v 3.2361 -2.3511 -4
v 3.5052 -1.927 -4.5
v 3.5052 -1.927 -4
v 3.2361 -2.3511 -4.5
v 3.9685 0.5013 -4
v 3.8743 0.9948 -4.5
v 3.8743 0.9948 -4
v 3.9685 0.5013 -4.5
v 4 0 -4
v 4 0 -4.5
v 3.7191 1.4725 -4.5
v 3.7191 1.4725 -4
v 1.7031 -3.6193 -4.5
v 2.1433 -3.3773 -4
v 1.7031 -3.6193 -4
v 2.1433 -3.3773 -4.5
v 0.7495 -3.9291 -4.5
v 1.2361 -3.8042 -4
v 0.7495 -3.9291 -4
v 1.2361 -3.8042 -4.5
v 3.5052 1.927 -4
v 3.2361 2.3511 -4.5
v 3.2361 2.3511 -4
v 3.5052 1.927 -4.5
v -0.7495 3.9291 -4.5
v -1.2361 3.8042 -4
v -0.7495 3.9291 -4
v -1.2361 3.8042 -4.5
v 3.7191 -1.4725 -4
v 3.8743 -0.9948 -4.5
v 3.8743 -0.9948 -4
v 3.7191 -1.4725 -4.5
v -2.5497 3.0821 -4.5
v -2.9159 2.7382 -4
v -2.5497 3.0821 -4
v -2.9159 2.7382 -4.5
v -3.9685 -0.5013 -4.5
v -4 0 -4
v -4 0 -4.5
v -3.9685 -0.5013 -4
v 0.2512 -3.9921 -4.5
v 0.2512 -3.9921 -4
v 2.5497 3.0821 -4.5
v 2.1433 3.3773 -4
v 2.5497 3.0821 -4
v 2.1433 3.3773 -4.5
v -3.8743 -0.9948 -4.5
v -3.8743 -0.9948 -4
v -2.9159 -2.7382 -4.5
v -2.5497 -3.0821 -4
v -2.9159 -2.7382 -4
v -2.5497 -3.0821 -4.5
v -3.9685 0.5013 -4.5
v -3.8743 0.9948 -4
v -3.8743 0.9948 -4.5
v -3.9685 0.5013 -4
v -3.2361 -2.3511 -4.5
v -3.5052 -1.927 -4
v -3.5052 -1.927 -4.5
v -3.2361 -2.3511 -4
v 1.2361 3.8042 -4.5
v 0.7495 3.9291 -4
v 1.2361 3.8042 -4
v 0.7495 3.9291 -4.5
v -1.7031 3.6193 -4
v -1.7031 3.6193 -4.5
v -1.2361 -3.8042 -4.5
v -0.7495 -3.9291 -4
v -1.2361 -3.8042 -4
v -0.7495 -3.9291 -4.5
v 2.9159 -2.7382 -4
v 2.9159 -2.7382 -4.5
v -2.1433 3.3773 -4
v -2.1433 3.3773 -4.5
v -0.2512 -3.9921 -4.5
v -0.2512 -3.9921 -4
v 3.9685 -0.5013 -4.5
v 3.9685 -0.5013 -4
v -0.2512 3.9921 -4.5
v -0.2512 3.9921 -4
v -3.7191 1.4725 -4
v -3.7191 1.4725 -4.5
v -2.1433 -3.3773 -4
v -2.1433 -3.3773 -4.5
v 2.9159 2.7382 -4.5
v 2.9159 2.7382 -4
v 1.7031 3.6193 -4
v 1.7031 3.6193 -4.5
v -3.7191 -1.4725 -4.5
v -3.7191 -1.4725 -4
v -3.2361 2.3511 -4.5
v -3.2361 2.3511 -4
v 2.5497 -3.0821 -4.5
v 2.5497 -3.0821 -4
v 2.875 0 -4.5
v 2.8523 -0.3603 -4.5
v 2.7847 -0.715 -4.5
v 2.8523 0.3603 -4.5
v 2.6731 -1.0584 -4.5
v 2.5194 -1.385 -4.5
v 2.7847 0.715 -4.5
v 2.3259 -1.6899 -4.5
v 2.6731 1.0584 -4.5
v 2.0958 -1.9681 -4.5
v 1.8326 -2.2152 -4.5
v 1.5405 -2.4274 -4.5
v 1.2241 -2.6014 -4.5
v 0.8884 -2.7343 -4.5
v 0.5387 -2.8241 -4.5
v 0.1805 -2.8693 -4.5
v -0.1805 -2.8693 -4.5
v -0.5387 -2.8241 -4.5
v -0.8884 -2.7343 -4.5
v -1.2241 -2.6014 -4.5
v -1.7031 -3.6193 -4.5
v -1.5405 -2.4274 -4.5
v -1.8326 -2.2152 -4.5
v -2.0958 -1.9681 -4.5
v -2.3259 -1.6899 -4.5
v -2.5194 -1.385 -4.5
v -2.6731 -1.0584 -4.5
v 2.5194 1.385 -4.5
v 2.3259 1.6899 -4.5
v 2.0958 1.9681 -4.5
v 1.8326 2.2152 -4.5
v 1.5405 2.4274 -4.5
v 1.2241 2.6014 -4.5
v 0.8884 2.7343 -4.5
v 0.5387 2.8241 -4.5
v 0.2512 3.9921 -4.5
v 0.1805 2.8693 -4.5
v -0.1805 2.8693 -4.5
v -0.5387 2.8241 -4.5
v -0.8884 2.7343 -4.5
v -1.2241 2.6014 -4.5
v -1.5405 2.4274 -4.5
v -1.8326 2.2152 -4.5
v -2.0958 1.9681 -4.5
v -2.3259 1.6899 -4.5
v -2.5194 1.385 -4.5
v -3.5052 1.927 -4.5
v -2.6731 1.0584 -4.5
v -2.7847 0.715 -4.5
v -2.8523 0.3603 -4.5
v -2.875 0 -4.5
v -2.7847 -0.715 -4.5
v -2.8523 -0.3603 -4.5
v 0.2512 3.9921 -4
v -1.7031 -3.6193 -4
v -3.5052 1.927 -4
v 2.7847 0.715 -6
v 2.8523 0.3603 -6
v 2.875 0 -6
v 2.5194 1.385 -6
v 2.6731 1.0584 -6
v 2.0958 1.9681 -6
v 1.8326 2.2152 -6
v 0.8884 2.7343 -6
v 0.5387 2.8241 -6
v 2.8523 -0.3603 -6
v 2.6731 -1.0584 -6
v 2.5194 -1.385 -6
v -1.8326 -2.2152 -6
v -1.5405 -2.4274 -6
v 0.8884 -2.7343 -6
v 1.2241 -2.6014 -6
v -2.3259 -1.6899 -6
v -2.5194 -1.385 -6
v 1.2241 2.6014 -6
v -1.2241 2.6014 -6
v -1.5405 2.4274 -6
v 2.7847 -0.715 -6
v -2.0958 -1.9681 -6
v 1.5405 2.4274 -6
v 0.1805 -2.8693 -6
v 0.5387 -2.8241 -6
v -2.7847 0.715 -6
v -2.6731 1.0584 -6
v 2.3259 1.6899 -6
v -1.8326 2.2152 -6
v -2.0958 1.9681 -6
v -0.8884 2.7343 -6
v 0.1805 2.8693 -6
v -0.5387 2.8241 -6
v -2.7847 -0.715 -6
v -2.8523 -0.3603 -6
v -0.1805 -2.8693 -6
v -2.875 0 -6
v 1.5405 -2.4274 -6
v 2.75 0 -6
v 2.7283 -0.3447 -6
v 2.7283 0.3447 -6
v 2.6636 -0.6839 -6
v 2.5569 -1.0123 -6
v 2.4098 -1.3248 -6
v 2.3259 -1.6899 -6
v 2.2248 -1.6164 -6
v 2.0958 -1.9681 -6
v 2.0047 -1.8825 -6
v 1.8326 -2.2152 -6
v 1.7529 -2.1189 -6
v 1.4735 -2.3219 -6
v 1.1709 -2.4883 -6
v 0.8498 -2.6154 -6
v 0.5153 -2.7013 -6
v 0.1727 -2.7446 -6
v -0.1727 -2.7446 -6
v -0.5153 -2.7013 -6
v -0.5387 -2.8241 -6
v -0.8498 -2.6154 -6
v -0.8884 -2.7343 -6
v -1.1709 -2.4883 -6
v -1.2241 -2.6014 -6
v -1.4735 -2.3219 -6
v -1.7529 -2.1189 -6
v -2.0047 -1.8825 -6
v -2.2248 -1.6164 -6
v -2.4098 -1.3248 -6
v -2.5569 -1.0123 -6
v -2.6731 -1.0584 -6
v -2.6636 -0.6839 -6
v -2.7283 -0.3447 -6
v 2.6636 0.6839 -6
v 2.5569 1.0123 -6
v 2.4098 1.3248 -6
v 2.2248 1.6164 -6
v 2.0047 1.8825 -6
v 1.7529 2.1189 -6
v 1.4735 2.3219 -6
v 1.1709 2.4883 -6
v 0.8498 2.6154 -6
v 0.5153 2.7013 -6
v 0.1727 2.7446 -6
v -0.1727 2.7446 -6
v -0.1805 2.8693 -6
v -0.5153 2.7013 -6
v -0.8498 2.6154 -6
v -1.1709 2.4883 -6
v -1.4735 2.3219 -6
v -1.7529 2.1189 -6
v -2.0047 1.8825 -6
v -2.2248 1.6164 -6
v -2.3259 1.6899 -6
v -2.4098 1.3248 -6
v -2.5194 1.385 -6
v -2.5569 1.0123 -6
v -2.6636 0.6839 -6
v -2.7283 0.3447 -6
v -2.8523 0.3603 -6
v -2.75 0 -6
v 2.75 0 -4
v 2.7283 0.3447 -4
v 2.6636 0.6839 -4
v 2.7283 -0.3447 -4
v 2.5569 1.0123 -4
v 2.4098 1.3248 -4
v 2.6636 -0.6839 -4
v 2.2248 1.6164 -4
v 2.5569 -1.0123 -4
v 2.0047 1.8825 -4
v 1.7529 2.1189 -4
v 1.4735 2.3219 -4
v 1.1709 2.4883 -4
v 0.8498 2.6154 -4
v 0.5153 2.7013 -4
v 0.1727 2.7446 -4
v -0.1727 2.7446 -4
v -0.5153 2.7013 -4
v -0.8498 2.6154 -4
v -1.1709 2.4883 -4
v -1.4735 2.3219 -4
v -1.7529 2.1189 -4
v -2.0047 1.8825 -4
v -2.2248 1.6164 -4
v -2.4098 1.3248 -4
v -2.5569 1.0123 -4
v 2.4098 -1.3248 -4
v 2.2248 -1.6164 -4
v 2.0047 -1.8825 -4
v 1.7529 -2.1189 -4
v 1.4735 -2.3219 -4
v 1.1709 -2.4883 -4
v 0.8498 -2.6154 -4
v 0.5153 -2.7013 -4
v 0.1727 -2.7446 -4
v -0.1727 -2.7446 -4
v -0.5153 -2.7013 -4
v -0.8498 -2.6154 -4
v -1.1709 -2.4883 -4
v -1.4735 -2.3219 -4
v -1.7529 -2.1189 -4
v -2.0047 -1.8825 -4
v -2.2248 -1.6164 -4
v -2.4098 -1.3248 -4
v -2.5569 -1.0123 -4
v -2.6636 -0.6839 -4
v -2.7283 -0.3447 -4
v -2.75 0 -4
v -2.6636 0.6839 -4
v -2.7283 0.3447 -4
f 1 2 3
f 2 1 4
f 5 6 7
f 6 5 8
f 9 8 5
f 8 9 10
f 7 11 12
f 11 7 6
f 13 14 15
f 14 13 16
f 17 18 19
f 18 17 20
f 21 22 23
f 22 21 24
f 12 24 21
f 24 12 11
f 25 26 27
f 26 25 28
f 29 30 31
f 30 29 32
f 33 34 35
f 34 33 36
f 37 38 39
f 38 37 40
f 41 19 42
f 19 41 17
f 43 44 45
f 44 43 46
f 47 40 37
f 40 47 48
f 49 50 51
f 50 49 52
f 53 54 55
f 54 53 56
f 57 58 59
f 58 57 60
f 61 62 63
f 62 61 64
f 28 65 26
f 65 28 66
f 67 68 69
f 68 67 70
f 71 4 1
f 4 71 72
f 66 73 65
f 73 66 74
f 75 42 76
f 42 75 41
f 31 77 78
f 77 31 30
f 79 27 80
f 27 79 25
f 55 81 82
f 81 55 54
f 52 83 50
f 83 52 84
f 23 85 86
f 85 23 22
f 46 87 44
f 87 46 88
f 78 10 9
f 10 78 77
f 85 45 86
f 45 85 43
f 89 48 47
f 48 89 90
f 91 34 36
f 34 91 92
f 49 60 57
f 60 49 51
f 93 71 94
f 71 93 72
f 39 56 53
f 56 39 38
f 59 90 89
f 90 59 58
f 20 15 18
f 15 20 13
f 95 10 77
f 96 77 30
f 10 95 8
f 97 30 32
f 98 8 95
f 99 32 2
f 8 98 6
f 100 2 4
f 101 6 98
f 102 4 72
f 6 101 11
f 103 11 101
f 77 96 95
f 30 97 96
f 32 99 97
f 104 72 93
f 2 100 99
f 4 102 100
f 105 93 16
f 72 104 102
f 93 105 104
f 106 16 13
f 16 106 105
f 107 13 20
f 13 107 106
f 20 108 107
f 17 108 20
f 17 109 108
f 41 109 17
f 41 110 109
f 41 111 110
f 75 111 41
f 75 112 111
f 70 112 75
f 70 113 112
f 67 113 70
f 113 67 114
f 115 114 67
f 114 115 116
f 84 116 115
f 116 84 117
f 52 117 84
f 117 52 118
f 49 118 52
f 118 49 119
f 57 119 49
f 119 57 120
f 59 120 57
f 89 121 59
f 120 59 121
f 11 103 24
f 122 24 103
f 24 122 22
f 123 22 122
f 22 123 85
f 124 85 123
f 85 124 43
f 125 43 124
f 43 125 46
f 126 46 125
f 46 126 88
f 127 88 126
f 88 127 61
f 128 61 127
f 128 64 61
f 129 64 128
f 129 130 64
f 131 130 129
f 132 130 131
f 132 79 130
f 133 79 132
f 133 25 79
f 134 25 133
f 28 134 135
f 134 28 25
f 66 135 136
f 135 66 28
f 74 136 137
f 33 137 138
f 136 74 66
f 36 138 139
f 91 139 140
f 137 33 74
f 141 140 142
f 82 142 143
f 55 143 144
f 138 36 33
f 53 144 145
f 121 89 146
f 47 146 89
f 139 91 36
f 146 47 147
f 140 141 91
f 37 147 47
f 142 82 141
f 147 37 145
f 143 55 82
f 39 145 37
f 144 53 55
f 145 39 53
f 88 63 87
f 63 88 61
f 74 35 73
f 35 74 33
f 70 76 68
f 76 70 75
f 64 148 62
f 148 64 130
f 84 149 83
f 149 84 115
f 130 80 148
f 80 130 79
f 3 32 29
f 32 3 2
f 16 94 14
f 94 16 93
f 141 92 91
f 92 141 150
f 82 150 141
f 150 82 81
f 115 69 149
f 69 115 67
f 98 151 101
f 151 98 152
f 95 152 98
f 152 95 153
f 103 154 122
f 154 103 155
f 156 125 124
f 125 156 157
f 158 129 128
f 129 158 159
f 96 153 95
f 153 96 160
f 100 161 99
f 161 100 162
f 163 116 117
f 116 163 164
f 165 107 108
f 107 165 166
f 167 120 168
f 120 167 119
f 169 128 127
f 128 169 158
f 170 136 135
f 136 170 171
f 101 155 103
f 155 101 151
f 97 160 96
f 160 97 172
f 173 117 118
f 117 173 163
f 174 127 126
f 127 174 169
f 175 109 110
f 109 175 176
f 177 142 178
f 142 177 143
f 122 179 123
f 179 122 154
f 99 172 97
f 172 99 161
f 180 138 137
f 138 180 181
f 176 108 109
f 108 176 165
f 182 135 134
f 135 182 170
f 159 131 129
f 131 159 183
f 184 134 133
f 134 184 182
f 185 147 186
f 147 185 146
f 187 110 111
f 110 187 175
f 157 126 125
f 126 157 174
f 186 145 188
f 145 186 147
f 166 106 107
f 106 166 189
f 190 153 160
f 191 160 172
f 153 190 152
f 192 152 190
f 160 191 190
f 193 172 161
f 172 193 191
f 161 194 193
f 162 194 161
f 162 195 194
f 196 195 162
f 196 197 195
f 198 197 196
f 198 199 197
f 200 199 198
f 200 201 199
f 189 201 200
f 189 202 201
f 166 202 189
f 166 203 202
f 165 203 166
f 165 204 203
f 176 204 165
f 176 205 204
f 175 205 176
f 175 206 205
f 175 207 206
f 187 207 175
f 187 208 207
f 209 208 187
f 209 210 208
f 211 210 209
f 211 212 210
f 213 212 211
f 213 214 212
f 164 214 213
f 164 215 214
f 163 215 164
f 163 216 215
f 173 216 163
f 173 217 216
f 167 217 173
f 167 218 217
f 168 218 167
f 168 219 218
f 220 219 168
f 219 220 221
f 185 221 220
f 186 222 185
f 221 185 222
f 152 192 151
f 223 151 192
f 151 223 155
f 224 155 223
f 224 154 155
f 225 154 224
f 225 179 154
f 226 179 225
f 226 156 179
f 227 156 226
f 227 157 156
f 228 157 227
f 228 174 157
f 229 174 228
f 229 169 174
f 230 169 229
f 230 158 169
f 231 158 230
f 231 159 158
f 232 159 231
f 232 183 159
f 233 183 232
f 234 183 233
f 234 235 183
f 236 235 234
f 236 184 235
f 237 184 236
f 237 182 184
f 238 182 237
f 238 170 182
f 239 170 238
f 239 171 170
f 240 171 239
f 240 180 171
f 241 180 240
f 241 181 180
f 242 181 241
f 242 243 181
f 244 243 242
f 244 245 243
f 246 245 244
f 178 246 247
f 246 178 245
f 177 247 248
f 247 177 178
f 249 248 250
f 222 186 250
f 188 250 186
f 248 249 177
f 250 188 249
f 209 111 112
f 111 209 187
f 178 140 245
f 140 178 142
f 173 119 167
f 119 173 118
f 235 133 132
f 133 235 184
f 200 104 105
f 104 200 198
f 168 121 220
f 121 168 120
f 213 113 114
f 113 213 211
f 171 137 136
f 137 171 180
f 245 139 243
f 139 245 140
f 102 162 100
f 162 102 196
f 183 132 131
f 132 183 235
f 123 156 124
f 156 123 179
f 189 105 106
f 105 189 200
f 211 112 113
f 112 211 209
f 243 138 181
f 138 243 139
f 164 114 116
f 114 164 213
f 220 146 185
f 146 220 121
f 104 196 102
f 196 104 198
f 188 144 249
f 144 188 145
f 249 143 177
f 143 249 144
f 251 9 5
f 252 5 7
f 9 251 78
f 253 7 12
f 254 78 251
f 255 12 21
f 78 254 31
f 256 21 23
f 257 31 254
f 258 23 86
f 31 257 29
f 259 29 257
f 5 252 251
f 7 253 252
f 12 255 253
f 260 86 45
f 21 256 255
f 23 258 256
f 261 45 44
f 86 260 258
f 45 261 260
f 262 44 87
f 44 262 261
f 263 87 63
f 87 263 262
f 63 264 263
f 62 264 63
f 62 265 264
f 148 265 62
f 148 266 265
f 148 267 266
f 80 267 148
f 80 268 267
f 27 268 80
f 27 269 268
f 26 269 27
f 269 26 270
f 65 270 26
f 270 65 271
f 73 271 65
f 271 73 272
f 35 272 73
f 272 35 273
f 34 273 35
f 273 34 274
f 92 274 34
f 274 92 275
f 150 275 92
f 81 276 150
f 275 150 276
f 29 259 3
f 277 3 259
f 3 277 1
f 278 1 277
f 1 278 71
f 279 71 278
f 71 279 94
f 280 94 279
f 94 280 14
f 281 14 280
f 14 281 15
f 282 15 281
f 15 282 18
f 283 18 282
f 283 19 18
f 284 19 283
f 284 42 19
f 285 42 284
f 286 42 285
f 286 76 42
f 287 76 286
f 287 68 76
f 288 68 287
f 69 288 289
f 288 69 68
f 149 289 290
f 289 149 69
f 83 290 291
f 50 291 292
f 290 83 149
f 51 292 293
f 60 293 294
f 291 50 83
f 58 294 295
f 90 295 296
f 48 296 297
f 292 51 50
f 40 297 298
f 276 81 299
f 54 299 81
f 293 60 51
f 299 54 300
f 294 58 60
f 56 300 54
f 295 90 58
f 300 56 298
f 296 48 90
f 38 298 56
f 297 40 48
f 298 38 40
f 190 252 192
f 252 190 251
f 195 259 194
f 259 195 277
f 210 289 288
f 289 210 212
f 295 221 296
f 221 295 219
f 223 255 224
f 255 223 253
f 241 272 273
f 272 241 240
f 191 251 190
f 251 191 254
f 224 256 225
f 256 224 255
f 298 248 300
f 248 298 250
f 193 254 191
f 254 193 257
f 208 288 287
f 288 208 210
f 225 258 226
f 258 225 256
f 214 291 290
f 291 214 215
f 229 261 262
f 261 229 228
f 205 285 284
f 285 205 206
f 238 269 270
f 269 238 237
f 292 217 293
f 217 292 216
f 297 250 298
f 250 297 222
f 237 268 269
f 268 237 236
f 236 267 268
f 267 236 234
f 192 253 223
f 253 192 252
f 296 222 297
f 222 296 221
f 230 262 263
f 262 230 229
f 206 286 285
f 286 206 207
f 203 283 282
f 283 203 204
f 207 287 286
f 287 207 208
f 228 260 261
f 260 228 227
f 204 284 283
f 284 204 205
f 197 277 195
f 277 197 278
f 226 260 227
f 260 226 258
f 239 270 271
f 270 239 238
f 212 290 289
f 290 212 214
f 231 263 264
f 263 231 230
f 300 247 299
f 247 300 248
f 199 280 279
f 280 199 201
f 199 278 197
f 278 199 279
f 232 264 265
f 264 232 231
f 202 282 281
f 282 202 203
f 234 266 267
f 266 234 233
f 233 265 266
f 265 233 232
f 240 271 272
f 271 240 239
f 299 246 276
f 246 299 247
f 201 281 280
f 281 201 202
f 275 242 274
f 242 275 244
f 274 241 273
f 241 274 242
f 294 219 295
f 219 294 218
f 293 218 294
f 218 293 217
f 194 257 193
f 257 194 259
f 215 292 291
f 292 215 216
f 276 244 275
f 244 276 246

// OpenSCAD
$fn = 50;

difference() {
	union() {
		translate(v = [0, 0, -4.5]) {
			cylinder(h = 4.5, r = 4.0);
		}
		#translate(v = [0, 0, -6.0]) {
			cylinder(h = 6, r = 2.875);
		}
	}
	union() {
		translate(v = [0, 0, 0]) {
			rotate(a = [0, 0, 0]) {
				difference() {
					union() {
						translate(v = [0, 0, -4]) {
							linear_extrude(height = 4) {
								polygon(points = [[4.8468, 0.0], [2.4234000000000004, 4.197451927062417], [-2.423399999999999, 4.197451927062417], [-4.8468, 5.935618106107392e-16], [-2.423400000000002, -4.197451927062416], [2.423399999999997, -4.197451927062419]]);
							}
						}
					}
					union();
				}
			}
		}
		#translate(v = [0, 0, -100.0]) {
			cylinder(h = 200, r = 2.75);
		}
	}
}
